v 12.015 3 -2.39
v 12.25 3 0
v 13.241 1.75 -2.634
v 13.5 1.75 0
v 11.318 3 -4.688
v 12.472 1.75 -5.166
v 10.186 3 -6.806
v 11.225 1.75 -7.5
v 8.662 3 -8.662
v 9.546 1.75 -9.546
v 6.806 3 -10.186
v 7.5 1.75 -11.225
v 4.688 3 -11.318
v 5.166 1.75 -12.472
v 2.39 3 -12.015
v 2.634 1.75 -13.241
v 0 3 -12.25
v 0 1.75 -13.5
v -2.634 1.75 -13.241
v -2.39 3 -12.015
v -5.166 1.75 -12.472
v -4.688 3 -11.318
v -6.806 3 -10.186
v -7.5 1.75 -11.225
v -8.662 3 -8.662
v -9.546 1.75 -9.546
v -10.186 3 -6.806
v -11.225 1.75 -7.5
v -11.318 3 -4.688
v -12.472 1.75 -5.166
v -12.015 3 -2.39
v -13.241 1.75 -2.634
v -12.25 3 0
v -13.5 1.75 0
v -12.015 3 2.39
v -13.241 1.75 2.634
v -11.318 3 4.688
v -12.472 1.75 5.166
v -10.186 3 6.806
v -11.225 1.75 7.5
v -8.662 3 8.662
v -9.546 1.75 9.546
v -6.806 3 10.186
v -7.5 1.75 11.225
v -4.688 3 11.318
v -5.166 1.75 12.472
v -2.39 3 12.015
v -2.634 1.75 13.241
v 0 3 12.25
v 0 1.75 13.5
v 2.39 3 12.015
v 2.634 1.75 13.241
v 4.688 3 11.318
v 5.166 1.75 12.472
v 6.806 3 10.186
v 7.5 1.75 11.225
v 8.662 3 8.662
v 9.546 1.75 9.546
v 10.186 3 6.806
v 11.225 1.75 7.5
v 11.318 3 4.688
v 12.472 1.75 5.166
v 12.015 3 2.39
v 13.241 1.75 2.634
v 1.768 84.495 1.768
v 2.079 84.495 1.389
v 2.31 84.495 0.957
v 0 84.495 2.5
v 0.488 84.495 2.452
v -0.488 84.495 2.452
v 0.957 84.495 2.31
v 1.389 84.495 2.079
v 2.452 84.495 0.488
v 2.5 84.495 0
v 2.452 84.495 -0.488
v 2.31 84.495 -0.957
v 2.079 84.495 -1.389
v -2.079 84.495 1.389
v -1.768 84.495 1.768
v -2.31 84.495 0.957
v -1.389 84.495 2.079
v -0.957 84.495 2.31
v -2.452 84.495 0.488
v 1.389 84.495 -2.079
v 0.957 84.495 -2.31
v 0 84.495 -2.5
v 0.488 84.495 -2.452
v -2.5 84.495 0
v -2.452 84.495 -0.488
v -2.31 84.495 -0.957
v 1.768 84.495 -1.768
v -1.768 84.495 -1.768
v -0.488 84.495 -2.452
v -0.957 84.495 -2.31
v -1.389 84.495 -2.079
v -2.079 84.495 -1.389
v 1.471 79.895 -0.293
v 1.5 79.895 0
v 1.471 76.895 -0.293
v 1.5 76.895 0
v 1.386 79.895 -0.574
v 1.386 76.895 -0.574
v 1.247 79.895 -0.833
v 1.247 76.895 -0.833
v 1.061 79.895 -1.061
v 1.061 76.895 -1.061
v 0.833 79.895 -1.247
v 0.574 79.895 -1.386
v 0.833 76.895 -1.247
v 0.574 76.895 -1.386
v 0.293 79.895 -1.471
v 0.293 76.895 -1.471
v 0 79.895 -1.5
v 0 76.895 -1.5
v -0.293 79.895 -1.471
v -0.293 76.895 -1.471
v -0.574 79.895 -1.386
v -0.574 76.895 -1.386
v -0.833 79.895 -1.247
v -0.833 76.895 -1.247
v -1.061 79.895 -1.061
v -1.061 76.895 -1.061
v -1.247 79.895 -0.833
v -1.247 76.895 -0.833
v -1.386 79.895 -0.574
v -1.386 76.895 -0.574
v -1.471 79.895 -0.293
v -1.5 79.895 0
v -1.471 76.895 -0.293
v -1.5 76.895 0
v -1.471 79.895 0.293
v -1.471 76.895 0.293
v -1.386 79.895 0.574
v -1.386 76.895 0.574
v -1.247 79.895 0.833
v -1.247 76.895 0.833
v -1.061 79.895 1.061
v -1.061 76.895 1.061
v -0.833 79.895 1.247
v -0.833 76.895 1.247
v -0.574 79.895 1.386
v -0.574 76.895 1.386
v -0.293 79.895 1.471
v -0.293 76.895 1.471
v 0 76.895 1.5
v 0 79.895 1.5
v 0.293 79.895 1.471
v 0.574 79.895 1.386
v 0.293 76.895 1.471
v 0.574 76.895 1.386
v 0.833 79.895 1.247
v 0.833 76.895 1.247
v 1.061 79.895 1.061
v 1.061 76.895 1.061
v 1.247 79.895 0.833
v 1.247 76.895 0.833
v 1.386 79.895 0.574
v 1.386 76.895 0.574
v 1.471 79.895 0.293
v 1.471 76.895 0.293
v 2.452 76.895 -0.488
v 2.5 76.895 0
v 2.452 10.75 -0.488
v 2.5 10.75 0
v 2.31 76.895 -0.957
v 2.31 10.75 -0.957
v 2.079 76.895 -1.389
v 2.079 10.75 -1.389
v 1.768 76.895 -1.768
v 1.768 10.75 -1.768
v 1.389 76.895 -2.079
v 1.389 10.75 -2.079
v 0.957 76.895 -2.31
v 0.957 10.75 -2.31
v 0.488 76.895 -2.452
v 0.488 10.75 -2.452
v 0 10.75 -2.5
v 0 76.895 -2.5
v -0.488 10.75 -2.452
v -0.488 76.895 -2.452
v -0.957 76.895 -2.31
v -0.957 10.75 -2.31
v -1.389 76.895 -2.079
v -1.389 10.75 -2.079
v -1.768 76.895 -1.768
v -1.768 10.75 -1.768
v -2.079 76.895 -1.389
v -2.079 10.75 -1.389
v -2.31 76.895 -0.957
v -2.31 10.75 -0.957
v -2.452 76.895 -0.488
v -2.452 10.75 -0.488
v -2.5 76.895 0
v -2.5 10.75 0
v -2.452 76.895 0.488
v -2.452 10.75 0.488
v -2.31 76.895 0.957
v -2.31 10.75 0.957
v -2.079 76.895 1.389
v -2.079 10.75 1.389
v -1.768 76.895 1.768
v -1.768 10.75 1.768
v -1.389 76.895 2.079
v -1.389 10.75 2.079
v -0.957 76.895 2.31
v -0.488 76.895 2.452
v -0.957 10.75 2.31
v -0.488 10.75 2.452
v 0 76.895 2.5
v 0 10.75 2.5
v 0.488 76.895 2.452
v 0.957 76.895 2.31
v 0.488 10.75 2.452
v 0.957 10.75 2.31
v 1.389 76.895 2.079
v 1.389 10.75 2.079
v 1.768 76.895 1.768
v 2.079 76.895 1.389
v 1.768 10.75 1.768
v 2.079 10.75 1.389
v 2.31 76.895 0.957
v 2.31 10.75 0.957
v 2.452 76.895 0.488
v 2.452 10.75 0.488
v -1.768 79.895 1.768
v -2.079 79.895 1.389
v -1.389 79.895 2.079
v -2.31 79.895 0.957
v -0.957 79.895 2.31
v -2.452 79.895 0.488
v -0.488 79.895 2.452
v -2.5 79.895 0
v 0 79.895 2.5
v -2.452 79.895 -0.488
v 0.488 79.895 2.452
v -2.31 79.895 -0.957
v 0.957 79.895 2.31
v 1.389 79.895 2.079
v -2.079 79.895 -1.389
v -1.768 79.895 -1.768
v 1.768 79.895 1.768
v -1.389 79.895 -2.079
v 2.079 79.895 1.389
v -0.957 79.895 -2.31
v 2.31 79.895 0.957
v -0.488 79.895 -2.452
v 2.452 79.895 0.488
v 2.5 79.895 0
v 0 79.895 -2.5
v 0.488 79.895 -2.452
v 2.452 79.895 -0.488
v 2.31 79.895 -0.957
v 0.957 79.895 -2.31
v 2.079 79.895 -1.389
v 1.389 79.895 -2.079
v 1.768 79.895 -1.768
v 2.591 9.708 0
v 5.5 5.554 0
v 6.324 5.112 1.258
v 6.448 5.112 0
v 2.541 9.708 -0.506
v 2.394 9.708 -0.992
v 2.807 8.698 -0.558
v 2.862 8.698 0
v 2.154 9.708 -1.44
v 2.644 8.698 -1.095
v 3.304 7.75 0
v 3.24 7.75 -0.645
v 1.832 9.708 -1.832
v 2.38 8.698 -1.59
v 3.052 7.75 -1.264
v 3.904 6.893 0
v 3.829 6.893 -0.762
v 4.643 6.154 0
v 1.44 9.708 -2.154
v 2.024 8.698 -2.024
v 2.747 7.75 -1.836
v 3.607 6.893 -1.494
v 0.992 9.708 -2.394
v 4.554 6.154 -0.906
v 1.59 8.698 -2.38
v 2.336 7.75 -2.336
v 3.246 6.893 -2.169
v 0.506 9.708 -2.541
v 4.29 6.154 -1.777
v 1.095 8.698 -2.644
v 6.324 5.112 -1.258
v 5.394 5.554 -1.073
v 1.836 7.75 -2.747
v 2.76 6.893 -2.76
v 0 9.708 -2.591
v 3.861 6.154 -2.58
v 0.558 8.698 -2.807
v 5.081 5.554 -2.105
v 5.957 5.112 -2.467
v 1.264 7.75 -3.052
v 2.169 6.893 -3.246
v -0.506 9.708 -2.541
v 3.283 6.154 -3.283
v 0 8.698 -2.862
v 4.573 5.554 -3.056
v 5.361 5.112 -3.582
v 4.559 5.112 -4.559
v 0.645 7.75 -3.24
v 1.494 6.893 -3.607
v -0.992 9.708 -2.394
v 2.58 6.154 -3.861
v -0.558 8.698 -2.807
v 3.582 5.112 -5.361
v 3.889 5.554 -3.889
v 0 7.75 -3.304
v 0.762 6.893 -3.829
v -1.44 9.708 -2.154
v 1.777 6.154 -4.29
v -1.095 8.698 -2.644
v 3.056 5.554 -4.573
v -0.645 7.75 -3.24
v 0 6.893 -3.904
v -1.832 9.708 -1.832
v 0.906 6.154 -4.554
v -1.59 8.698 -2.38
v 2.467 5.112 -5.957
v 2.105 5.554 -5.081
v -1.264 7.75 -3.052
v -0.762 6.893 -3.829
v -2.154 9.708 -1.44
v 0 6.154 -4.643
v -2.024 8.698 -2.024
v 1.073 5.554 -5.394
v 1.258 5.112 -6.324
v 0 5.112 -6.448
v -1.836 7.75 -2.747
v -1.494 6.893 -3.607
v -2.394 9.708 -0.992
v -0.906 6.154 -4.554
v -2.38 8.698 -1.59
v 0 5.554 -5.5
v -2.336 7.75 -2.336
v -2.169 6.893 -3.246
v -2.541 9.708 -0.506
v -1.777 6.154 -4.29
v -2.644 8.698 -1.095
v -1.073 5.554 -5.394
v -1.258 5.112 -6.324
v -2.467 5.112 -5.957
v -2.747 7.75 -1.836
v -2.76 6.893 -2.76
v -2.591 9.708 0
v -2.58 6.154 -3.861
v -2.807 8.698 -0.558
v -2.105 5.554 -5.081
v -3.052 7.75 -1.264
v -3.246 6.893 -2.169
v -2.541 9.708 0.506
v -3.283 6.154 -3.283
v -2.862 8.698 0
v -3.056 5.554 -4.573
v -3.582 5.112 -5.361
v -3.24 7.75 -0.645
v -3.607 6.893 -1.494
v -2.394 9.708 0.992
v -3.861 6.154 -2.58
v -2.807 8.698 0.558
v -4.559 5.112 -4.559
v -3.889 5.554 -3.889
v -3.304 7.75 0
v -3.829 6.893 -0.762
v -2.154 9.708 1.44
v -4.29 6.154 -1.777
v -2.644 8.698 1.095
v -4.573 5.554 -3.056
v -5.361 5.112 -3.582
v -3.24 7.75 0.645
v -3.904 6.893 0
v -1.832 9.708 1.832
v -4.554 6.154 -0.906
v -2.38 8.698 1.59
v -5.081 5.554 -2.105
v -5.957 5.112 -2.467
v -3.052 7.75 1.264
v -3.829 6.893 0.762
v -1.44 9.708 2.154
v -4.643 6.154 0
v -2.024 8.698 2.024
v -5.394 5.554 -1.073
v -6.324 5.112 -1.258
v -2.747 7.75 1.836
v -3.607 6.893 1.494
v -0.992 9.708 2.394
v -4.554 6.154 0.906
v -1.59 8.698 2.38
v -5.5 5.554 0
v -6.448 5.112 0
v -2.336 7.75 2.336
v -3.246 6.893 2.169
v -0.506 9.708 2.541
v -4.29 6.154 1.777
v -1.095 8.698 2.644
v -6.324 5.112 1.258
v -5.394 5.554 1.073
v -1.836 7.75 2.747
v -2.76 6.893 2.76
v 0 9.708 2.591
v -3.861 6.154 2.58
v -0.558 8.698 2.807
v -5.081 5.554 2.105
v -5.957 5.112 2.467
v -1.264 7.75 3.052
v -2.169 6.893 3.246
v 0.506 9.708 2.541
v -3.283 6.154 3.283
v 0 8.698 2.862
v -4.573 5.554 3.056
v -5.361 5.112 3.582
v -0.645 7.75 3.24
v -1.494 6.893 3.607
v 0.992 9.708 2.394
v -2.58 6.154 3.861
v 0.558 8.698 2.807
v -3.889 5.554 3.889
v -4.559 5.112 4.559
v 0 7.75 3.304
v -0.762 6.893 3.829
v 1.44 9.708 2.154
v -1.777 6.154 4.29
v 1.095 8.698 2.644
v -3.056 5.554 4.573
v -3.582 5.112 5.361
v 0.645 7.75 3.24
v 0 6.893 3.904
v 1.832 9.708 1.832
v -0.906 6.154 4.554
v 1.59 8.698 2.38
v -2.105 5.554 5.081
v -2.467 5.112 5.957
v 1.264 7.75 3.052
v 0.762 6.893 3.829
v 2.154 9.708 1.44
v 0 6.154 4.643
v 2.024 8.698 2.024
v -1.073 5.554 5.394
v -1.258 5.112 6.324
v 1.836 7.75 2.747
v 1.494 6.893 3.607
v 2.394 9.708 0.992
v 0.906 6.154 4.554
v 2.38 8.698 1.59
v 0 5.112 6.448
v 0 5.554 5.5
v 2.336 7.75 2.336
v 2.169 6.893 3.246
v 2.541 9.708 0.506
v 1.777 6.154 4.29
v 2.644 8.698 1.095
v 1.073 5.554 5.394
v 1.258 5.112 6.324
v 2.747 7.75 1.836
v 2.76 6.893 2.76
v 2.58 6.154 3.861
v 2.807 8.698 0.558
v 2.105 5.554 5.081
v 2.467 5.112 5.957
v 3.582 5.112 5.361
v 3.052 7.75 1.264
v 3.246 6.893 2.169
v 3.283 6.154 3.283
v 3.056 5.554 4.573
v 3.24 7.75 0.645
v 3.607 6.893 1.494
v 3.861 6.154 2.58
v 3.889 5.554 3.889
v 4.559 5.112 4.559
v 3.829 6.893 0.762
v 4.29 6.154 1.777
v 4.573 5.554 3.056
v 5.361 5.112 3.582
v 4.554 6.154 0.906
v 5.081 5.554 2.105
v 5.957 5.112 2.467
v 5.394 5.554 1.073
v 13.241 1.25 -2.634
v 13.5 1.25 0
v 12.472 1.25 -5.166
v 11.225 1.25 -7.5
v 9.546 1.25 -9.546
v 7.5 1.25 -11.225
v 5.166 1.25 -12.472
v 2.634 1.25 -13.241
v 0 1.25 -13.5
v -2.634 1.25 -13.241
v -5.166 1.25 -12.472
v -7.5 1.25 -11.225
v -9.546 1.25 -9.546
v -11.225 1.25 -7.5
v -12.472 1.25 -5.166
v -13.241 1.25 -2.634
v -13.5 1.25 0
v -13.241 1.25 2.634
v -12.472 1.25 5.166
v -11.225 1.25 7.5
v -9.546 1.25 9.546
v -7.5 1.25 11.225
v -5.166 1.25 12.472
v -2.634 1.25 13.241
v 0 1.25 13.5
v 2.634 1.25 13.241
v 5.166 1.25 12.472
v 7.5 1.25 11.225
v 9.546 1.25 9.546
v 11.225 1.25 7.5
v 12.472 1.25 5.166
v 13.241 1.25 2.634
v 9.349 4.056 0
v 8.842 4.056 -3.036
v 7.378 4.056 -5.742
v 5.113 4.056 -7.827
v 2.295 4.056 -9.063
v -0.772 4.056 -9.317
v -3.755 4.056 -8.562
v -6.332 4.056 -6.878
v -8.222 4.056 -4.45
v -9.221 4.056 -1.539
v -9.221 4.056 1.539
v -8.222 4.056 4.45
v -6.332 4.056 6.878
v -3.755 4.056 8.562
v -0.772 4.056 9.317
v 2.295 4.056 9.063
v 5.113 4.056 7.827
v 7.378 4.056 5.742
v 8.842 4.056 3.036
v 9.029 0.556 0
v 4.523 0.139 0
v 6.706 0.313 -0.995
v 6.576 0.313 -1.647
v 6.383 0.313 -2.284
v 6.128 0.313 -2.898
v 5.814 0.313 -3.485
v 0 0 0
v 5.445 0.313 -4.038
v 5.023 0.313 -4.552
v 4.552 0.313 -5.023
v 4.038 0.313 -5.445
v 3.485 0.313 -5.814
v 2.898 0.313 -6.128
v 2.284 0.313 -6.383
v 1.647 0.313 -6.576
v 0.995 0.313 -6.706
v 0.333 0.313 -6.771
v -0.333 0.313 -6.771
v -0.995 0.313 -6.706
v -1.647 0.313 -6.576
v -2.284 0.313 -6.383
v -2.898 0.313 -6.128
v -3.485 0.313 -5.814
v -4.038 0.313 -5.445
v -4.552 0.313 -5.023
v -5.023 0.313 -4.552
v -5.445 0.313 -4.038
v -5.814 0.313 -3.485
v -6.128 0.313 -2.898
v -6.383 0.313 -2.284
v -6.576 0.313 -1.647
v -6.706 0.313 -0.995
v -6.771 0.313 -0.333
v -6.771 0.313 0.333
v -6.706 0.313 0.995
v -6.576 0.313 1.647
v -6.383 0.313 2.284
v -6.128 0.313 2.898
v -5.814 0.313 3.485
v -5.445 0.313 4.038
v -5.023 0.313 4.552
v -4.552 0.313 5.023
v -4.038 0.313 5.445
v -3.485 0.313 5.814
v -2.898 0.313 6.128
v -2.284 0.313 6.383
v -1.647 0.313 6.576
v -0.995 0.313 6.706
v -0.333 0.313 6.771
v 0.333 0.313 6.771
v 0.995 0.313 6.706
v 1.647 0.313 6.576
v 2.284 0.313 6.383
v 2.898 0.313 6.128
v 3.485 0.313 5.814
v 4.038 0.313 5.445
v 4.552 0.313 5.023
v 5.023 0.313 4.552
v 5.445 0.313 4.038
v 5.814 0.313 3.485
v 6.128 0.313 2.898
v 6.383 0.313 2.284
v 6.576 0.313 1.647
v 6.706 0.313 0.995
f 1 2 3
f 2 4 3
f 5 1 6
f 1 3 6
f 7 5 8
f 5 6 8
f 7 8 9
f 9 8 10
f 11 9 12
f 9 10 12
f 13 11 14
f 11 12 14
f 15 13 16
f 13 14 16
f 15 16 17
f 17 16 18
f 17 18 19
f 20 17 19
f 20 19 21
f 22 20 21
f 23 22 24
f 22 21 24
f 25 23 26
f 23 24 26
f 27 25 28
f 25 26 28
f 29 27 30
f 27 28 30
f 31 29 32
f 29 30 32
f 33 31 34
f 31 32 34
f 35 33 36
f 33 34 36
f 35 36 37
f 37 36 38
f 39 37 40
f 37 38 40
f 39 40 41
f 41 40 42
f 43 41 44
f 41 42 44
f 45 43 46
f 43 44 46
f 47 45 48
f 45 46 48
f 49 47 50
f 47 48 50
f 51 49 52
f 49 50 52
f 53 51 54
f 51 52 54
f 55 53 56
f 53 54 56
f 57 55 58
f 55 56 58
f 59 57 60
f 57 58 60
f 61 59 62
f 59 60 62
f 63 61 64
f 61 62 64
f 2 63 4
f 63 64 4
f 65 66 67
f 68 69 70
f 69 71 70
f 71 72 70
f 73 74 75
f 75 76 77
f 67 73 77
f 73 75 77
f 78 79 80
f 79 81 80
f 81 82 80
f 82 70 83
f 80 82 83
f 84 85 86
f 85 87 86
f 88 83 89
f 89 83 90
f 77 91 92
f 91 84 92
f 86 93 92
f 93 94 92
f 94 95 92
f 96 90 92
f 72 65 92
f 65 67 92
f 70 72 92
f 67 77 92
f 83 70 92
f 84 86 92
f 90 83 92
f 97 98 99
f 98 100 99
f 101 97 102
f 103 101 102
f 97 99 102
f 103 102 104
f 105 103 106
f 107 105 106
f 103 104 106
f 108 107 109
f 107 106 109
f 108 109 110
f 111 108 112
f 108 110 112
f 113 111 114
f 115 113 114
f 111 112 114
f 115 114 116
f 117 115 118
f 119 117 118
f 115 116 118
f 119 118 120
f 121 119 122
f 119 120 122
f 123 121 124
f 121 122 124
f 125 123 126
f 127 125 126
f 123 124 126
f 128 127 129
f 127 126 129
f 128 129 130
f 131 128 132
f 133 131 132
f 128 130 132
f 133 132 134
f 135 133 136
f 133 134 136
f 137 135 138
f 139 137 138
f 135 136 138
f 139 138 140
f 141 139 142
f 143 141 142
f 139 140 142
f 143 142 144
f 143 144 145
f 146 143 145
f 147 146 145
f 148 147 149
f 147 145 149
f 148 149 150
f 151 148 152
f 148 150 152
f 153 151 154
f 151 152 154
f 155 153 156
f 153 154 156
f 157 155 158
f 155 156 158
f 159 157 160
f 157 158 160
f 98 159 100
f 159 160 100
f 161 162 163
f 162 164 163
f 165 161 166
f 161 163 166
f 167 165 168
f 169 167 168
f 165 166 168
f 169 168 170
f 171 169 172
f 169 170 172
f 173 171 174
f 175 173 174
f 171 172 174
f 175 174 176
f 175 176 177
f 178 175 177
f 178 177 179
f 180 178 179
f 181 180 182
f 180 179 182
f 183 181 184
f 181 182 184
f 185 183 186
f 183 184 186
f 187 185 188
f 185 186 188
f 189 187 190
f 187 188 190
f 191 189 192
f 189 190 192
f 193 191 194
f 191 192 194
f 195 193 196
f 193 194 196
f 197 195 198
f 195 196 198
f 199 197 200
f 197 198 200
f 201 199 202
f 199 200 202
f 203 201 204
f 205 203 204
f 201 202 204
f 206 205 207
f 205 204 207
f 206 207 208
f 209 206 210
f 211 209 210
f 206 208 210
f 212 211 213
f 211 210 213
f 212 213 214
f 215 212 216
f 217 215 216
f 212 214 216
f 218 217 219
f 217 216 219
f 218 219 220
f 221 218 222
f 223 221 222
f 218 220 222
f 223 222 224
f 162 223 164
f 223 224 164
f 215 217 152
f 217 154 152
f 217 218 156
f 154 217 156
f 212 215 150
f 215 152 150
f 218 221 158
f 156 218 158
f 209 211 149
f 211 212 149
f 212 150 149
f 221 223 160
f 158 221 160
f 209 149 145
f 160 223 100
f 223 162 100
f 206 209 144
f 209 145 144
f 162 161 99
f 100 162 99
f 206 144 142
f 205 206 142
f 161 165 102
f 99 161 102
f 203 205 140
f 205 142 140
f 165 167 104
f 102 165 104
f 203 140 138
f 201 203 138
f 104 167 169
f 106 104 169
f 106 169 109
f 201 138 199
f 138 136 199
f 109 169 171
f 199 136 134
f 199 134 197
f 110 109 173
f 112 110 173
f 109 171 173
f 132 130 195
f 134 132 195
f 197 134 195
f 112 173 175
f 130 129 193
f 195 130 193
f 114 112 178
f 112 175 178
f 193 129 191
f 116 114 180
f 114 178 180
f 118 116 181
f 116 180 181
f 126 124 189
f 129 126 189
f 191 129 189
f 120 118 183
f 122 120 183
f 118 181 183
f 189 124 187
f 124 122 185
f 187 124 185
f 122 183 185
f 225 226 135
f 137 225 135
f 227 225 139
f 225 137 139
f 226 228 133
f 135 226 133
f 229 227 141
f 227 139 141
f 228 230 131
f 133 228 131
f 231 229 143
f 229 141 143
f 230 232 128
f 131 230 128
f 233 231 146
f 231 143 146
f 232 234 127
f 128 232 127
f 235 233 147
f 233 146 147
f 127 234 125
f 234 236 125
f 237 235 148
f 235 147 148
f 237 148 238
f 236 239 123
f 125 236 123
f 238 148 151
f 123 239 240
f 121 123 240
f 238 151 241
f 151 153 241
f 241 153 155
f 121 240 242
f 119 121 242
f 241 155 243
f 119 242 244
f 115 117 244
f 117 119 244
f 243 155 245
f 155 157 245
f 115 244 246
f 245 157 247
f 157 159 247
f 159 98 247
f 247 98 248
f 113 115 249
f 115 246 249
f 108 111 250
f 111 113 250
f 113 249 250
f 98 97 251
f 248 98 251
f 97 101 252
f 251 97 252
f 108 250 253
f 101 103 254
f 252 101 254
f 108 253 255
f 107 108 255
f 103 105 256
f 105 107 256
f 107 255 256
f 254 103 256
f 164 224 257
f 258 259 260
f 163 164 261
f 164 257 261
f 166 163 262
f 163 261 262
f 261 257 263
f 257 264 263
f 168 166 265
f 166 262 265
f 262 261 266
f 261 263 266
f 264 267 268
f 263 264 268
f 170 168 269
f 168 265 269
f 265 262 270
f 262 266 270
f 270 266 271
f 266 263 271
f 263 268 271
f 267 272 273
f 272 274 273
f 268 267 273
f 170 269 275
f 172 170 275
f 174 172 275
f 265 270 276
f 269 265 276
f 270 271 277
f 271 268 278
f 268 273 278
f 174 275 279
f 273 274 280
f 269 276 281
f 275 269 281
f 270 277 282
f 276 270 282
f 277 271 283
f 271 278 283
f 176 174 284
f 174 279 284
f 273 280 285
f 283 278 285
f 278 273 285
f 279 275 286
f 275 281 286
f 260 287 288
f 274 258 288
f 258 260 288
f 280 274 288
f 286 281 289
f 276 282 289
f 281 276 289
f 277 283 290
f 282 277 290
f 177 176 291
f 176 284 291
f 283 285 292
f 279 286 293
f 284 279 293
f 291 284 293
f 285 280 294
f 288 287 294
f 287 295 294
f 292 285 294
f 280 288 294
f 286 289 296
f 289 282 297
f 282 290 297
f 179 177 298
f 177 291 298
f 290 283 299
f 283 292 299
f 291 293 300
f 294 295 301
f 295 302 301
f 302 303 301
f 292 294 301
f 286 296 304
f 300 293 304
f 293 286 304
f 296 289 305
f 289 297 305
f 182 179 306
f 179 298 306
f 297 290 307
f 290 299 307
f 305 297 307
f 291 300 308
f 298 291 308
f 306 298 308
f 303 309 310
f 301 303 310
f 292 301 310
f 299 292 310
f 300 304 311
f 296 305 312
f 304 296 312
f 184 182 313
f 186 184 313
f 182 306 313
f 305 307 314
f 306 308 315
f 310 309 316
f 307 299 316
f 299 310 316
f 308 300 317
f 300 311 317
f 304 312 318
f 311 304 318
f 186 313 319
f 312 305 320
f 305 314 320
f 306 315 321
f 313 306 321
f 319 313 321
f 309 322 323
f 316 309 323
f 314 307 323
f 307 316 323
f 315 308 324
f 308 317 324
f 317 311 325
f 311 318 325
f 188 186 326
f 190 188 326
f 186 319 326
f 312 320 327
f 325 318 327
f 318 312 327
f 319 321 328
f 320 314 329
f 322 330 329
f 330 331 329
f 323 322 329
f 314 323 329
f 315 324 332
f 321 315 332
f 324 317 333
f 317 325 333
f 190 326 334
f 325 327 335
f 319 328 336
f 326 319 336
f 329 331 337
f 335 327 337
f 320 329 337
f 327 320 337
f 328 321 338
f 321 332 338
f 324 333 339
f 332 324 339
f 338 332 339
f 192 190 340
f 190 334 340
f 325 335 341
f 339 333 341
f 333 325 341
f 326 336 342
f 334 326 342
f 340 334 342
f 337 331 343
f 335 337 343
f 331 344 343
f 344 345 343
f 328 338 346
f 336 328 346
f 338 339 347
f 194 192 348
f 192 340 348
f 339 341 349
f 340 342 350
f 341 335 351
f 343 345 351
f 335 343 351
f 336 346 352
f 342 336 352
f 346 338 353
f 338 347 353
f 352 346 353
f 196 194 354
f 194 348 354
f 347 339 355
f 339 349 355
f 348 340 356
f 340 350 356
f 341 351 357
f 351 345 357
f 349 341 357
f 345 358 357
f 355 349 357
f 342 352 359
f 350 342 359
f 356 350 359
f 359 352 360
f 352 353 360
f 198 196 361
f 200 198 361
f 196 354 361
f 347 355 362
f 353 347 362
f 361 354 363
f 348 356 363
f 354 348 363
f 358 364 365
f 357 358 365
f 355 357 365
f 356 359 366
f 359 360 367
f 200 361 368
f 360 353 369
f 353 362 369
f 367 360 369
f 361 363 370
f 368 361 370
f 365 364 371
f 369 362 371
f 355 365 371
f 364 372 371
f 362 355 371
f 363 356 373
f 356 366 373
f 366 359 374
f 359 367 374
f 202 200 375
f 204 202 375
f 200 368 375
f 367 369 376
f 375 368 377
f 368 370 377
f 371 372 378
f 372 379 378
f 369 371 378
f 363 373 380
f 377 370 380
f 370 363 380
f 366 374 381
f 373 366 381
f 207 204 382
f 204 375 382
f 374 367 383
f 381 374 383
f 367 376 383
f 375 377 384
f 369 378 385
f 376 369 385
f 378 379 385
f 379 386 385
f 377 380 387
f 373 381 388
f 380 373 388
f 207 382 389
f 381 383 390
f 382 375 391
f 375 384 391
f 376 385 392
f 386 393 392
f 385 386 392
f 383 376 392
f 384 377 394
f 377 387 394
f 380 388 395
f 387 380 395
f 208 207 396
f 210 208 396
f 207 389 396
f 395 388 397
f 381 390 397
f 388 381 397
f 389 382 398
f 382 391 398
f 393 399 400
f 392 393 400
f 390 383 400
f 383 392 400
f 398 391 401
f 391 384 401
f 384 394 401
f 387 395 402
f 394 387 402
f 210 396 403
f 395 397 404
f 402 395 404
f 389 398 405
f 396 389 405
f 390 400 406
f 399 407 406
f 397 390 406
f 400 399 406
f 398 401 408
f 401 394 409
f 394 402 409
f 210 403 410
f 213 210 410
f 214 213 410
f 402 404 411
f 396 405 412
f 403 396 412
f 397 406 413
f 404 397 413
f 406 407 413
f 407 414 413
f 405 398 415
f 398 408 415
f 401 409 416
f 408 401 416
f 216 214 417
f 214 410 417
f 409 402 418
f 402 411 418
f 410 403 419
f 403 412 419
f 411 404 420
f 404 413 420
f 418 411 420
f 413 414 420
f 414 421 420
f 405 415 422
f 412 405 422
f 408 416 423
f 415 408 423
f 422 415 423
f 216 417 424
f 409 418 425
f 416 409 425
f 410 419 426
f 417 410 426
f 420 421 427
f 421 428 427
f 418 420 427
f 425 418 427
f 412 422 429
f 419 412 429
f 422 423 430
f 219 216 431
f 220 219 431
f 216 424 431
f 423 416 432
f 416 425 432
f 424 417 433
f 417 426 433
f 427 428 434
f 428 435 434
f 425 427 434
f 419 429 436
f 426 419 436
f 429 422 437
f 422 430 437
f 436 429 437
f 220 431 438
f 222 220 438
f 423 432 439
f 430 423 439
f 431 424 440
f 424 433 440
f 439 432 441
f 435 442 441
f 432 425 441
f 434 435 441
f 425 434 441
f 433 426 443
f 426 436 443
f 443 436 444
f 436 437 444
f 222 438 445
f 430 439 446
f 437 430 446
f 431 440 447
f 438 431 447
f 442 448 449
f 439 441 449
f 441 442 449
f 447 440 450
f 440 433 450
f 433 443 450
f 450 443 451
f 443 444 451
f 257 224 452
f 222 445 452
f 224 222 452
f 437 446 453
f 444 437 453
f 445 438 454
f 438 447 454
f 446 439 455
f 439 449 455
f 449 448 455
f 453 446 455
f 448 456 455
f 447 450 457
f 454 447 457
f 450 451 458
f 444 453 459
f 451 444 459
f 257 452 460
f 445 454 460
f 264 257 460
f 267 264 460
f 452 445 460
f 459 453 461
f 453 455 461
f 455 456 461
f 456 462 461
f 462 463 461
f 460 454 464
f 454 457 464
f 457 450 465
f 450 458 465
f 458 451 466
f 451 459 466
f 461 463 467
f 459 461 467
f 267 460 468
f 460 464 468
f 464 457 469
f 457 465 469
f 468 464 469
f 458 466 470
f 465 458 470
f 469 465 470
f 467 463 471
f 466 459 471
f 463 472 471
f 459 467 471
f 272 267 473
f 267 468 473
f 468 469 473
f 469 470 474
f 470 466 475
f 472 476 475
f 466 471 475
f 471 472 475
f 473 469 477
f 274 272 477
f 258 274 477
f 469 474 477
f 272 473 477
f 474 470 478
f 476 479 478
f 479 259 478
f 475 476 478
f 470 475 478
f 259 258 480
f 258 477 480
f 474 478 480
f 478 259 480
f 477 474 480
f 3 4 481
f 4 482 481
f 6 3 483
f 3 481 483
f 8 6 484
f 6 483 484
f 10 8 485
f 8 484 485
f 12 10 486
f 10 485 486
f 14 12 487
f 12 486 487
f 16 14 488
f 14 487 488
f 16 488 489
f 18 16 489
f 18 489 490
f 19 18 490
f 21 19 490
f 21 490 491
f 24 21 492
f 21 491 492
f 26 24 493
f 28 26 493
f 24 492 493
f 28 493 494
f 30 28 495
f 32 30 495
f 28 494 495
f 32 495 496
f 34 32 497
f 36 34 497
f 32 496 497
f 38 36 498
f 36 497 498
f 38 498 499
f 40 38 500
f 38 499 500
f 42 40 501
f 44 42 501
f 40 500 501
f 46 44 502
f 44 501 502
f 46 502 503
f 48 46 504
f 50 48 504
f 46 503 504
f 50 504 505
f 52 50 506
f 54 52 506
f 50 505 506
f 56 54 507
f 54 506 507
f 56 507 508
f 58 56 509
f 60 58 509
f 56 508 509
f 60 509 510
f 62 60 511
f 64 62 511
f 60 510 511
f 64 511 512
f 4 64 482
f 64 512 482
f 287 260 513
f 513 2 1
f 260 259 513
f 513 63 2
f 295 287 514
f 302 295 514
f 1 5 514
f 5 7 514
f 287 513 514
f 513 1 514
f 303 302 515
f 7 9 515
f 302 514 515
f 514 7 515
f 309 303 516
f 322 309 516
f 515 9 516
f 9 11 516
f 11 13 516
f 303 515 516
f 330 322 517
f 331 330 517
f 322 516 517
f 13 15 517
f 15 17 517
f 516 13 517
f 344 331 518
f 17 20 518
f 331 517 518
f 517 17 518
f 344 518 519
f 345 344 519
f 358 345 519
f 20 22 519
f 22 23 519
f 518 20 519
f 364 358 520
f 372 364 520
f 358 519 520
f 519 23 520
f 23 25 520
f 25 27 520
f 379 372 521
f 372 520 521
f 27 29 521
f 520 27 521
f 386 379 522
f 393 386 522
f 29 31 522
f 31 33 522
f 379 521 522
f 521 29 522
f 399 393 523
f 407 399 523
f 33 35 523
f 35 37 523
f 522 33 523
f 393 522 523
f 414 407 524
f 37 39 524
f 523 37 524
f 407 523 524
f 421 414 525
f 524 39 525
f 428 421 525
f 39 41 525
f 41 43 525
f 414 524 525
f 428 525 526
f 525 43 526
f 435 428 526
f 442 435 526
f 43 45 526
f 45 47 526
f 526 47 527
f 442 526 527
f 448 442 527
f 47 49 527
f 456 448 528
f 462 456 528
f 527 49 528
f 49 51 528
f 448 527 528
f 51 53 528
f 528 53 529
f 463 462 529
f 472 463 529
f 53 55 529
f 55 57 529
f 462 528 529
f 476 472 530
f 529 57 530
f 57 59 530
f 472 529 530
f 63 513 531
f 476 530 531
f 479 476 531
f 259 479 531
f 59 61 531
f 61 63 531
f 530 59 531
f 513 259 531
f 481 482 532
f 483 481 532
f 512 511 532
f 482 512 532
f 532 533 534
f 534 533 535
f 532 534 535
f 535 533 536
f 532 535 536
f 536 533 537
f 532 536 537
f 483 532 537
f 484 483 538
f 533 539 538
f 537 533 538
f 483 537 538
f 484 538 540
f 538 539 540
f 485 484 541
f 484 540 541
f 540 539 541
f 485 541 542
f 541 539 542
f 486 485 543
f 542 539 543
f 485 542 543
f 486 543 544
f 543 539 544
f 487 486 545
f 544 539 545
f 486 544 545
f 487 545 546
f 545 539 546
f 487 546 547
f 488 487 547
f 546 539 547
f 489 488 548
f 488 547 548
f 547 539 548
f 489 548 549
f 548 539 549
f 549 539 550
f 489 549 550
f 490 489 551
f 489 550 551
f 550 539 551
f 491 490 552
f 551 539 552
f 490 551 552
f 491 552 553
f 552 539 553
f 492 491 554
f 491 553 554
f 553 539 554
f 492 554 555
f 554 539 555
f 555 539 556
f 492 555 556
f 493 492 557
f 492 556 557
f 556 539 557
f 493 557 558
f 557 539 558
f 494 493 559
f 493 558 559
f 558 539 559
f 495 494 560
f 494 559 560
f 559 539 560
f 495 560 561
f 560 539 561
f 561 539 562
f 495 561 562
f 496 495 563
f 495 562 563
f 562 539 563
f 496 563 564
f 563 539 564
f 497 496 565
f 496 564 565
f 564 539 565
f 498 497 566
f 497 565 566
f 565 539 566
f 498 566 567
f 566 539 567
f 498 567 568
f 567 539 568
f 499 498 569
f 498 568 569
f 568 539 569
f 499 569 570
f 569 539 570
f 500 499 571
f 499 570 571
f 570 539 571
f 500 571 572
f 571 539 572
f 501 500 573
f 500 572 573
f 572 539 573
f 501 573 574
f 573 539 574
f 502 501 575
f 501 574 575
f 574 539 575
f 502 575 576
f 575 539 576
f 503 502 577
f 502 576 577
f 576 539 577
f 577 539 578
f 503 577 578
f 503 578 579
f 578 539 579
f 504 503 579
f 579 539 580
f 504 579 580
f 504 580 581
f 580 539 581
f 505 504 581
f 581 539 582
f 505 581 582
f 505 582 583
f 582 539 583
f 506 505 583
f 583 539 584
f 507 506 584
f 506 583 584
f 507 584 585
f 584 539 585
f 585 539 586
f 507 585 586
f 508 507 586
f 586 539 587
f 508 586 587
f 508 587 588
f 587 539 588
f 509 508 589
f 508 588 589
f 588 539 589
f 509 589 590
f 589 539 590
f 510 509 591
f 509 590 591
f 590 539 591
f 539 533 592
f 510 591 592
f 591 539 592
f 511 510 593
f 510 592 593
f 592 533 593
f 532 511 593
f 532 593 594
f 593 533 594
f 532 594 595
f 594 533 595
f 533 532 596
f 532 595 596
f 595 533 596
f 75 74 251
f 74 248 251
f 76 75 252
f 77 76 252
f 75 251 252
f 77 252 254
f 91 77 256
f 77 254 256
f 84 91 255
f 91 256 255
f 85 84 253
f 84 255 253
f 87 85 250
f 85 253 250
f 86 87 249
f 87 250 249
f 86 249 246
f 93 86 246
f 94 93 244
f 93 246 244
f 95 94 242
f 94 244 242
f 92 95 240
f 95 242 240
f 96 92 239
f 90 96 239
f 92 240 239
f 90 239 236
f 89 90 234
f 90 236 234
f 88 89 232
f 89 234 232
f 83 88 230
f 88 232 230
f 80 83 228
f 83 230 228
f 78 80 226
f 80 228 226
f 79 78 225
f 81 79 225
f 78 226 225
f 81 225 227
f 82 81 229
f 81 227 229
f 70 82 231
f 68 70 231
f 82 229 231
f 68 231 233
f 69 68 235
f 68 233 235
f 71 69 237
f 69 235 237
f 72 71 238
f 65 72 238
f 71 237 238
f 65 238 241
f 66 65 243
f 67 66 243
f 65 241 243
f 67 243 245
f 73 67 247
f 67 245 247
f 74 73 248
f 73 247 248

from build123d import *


with BuildPart() as part:
    # Sketch1 → Revolve1 (revolve)
    with BuildSketch(Plane.XY):
        with BuildLine():
            Line((0, 0), (0, 84.495))
            Line((0, 84.495), (2.5, 84.495))
            Line((2.5, 84.495), (2.5, 79.895))
            Line((2.5, 79.895), (1.5, 79.895))
            Line((1.5, 79.895), (1.5, 76.895))
            Line((1.5, 76.895), (2.5, 76.895))
            Line((2.5, 76.895), (2.5, 10.749955013))
            ThreePointArc((2.5, 10.749955013), (3.585087734, 7.308496395), (6.44787914, 5.111799289))
            Line((6.44787914, 5.111799289), (12.25, 3))
            Line((12.25, 3), (13.5, 1.75))
            Line((13.5, 1.75), (13.5, 1.25))
            ThreePointArc((13.5, 1.25), (6.778873431, 0.31316694), (0, 0))
        make_face()
    revolve(axis=Axis((0, 0, 0), (0, 1, 0)))


solid = part.part
